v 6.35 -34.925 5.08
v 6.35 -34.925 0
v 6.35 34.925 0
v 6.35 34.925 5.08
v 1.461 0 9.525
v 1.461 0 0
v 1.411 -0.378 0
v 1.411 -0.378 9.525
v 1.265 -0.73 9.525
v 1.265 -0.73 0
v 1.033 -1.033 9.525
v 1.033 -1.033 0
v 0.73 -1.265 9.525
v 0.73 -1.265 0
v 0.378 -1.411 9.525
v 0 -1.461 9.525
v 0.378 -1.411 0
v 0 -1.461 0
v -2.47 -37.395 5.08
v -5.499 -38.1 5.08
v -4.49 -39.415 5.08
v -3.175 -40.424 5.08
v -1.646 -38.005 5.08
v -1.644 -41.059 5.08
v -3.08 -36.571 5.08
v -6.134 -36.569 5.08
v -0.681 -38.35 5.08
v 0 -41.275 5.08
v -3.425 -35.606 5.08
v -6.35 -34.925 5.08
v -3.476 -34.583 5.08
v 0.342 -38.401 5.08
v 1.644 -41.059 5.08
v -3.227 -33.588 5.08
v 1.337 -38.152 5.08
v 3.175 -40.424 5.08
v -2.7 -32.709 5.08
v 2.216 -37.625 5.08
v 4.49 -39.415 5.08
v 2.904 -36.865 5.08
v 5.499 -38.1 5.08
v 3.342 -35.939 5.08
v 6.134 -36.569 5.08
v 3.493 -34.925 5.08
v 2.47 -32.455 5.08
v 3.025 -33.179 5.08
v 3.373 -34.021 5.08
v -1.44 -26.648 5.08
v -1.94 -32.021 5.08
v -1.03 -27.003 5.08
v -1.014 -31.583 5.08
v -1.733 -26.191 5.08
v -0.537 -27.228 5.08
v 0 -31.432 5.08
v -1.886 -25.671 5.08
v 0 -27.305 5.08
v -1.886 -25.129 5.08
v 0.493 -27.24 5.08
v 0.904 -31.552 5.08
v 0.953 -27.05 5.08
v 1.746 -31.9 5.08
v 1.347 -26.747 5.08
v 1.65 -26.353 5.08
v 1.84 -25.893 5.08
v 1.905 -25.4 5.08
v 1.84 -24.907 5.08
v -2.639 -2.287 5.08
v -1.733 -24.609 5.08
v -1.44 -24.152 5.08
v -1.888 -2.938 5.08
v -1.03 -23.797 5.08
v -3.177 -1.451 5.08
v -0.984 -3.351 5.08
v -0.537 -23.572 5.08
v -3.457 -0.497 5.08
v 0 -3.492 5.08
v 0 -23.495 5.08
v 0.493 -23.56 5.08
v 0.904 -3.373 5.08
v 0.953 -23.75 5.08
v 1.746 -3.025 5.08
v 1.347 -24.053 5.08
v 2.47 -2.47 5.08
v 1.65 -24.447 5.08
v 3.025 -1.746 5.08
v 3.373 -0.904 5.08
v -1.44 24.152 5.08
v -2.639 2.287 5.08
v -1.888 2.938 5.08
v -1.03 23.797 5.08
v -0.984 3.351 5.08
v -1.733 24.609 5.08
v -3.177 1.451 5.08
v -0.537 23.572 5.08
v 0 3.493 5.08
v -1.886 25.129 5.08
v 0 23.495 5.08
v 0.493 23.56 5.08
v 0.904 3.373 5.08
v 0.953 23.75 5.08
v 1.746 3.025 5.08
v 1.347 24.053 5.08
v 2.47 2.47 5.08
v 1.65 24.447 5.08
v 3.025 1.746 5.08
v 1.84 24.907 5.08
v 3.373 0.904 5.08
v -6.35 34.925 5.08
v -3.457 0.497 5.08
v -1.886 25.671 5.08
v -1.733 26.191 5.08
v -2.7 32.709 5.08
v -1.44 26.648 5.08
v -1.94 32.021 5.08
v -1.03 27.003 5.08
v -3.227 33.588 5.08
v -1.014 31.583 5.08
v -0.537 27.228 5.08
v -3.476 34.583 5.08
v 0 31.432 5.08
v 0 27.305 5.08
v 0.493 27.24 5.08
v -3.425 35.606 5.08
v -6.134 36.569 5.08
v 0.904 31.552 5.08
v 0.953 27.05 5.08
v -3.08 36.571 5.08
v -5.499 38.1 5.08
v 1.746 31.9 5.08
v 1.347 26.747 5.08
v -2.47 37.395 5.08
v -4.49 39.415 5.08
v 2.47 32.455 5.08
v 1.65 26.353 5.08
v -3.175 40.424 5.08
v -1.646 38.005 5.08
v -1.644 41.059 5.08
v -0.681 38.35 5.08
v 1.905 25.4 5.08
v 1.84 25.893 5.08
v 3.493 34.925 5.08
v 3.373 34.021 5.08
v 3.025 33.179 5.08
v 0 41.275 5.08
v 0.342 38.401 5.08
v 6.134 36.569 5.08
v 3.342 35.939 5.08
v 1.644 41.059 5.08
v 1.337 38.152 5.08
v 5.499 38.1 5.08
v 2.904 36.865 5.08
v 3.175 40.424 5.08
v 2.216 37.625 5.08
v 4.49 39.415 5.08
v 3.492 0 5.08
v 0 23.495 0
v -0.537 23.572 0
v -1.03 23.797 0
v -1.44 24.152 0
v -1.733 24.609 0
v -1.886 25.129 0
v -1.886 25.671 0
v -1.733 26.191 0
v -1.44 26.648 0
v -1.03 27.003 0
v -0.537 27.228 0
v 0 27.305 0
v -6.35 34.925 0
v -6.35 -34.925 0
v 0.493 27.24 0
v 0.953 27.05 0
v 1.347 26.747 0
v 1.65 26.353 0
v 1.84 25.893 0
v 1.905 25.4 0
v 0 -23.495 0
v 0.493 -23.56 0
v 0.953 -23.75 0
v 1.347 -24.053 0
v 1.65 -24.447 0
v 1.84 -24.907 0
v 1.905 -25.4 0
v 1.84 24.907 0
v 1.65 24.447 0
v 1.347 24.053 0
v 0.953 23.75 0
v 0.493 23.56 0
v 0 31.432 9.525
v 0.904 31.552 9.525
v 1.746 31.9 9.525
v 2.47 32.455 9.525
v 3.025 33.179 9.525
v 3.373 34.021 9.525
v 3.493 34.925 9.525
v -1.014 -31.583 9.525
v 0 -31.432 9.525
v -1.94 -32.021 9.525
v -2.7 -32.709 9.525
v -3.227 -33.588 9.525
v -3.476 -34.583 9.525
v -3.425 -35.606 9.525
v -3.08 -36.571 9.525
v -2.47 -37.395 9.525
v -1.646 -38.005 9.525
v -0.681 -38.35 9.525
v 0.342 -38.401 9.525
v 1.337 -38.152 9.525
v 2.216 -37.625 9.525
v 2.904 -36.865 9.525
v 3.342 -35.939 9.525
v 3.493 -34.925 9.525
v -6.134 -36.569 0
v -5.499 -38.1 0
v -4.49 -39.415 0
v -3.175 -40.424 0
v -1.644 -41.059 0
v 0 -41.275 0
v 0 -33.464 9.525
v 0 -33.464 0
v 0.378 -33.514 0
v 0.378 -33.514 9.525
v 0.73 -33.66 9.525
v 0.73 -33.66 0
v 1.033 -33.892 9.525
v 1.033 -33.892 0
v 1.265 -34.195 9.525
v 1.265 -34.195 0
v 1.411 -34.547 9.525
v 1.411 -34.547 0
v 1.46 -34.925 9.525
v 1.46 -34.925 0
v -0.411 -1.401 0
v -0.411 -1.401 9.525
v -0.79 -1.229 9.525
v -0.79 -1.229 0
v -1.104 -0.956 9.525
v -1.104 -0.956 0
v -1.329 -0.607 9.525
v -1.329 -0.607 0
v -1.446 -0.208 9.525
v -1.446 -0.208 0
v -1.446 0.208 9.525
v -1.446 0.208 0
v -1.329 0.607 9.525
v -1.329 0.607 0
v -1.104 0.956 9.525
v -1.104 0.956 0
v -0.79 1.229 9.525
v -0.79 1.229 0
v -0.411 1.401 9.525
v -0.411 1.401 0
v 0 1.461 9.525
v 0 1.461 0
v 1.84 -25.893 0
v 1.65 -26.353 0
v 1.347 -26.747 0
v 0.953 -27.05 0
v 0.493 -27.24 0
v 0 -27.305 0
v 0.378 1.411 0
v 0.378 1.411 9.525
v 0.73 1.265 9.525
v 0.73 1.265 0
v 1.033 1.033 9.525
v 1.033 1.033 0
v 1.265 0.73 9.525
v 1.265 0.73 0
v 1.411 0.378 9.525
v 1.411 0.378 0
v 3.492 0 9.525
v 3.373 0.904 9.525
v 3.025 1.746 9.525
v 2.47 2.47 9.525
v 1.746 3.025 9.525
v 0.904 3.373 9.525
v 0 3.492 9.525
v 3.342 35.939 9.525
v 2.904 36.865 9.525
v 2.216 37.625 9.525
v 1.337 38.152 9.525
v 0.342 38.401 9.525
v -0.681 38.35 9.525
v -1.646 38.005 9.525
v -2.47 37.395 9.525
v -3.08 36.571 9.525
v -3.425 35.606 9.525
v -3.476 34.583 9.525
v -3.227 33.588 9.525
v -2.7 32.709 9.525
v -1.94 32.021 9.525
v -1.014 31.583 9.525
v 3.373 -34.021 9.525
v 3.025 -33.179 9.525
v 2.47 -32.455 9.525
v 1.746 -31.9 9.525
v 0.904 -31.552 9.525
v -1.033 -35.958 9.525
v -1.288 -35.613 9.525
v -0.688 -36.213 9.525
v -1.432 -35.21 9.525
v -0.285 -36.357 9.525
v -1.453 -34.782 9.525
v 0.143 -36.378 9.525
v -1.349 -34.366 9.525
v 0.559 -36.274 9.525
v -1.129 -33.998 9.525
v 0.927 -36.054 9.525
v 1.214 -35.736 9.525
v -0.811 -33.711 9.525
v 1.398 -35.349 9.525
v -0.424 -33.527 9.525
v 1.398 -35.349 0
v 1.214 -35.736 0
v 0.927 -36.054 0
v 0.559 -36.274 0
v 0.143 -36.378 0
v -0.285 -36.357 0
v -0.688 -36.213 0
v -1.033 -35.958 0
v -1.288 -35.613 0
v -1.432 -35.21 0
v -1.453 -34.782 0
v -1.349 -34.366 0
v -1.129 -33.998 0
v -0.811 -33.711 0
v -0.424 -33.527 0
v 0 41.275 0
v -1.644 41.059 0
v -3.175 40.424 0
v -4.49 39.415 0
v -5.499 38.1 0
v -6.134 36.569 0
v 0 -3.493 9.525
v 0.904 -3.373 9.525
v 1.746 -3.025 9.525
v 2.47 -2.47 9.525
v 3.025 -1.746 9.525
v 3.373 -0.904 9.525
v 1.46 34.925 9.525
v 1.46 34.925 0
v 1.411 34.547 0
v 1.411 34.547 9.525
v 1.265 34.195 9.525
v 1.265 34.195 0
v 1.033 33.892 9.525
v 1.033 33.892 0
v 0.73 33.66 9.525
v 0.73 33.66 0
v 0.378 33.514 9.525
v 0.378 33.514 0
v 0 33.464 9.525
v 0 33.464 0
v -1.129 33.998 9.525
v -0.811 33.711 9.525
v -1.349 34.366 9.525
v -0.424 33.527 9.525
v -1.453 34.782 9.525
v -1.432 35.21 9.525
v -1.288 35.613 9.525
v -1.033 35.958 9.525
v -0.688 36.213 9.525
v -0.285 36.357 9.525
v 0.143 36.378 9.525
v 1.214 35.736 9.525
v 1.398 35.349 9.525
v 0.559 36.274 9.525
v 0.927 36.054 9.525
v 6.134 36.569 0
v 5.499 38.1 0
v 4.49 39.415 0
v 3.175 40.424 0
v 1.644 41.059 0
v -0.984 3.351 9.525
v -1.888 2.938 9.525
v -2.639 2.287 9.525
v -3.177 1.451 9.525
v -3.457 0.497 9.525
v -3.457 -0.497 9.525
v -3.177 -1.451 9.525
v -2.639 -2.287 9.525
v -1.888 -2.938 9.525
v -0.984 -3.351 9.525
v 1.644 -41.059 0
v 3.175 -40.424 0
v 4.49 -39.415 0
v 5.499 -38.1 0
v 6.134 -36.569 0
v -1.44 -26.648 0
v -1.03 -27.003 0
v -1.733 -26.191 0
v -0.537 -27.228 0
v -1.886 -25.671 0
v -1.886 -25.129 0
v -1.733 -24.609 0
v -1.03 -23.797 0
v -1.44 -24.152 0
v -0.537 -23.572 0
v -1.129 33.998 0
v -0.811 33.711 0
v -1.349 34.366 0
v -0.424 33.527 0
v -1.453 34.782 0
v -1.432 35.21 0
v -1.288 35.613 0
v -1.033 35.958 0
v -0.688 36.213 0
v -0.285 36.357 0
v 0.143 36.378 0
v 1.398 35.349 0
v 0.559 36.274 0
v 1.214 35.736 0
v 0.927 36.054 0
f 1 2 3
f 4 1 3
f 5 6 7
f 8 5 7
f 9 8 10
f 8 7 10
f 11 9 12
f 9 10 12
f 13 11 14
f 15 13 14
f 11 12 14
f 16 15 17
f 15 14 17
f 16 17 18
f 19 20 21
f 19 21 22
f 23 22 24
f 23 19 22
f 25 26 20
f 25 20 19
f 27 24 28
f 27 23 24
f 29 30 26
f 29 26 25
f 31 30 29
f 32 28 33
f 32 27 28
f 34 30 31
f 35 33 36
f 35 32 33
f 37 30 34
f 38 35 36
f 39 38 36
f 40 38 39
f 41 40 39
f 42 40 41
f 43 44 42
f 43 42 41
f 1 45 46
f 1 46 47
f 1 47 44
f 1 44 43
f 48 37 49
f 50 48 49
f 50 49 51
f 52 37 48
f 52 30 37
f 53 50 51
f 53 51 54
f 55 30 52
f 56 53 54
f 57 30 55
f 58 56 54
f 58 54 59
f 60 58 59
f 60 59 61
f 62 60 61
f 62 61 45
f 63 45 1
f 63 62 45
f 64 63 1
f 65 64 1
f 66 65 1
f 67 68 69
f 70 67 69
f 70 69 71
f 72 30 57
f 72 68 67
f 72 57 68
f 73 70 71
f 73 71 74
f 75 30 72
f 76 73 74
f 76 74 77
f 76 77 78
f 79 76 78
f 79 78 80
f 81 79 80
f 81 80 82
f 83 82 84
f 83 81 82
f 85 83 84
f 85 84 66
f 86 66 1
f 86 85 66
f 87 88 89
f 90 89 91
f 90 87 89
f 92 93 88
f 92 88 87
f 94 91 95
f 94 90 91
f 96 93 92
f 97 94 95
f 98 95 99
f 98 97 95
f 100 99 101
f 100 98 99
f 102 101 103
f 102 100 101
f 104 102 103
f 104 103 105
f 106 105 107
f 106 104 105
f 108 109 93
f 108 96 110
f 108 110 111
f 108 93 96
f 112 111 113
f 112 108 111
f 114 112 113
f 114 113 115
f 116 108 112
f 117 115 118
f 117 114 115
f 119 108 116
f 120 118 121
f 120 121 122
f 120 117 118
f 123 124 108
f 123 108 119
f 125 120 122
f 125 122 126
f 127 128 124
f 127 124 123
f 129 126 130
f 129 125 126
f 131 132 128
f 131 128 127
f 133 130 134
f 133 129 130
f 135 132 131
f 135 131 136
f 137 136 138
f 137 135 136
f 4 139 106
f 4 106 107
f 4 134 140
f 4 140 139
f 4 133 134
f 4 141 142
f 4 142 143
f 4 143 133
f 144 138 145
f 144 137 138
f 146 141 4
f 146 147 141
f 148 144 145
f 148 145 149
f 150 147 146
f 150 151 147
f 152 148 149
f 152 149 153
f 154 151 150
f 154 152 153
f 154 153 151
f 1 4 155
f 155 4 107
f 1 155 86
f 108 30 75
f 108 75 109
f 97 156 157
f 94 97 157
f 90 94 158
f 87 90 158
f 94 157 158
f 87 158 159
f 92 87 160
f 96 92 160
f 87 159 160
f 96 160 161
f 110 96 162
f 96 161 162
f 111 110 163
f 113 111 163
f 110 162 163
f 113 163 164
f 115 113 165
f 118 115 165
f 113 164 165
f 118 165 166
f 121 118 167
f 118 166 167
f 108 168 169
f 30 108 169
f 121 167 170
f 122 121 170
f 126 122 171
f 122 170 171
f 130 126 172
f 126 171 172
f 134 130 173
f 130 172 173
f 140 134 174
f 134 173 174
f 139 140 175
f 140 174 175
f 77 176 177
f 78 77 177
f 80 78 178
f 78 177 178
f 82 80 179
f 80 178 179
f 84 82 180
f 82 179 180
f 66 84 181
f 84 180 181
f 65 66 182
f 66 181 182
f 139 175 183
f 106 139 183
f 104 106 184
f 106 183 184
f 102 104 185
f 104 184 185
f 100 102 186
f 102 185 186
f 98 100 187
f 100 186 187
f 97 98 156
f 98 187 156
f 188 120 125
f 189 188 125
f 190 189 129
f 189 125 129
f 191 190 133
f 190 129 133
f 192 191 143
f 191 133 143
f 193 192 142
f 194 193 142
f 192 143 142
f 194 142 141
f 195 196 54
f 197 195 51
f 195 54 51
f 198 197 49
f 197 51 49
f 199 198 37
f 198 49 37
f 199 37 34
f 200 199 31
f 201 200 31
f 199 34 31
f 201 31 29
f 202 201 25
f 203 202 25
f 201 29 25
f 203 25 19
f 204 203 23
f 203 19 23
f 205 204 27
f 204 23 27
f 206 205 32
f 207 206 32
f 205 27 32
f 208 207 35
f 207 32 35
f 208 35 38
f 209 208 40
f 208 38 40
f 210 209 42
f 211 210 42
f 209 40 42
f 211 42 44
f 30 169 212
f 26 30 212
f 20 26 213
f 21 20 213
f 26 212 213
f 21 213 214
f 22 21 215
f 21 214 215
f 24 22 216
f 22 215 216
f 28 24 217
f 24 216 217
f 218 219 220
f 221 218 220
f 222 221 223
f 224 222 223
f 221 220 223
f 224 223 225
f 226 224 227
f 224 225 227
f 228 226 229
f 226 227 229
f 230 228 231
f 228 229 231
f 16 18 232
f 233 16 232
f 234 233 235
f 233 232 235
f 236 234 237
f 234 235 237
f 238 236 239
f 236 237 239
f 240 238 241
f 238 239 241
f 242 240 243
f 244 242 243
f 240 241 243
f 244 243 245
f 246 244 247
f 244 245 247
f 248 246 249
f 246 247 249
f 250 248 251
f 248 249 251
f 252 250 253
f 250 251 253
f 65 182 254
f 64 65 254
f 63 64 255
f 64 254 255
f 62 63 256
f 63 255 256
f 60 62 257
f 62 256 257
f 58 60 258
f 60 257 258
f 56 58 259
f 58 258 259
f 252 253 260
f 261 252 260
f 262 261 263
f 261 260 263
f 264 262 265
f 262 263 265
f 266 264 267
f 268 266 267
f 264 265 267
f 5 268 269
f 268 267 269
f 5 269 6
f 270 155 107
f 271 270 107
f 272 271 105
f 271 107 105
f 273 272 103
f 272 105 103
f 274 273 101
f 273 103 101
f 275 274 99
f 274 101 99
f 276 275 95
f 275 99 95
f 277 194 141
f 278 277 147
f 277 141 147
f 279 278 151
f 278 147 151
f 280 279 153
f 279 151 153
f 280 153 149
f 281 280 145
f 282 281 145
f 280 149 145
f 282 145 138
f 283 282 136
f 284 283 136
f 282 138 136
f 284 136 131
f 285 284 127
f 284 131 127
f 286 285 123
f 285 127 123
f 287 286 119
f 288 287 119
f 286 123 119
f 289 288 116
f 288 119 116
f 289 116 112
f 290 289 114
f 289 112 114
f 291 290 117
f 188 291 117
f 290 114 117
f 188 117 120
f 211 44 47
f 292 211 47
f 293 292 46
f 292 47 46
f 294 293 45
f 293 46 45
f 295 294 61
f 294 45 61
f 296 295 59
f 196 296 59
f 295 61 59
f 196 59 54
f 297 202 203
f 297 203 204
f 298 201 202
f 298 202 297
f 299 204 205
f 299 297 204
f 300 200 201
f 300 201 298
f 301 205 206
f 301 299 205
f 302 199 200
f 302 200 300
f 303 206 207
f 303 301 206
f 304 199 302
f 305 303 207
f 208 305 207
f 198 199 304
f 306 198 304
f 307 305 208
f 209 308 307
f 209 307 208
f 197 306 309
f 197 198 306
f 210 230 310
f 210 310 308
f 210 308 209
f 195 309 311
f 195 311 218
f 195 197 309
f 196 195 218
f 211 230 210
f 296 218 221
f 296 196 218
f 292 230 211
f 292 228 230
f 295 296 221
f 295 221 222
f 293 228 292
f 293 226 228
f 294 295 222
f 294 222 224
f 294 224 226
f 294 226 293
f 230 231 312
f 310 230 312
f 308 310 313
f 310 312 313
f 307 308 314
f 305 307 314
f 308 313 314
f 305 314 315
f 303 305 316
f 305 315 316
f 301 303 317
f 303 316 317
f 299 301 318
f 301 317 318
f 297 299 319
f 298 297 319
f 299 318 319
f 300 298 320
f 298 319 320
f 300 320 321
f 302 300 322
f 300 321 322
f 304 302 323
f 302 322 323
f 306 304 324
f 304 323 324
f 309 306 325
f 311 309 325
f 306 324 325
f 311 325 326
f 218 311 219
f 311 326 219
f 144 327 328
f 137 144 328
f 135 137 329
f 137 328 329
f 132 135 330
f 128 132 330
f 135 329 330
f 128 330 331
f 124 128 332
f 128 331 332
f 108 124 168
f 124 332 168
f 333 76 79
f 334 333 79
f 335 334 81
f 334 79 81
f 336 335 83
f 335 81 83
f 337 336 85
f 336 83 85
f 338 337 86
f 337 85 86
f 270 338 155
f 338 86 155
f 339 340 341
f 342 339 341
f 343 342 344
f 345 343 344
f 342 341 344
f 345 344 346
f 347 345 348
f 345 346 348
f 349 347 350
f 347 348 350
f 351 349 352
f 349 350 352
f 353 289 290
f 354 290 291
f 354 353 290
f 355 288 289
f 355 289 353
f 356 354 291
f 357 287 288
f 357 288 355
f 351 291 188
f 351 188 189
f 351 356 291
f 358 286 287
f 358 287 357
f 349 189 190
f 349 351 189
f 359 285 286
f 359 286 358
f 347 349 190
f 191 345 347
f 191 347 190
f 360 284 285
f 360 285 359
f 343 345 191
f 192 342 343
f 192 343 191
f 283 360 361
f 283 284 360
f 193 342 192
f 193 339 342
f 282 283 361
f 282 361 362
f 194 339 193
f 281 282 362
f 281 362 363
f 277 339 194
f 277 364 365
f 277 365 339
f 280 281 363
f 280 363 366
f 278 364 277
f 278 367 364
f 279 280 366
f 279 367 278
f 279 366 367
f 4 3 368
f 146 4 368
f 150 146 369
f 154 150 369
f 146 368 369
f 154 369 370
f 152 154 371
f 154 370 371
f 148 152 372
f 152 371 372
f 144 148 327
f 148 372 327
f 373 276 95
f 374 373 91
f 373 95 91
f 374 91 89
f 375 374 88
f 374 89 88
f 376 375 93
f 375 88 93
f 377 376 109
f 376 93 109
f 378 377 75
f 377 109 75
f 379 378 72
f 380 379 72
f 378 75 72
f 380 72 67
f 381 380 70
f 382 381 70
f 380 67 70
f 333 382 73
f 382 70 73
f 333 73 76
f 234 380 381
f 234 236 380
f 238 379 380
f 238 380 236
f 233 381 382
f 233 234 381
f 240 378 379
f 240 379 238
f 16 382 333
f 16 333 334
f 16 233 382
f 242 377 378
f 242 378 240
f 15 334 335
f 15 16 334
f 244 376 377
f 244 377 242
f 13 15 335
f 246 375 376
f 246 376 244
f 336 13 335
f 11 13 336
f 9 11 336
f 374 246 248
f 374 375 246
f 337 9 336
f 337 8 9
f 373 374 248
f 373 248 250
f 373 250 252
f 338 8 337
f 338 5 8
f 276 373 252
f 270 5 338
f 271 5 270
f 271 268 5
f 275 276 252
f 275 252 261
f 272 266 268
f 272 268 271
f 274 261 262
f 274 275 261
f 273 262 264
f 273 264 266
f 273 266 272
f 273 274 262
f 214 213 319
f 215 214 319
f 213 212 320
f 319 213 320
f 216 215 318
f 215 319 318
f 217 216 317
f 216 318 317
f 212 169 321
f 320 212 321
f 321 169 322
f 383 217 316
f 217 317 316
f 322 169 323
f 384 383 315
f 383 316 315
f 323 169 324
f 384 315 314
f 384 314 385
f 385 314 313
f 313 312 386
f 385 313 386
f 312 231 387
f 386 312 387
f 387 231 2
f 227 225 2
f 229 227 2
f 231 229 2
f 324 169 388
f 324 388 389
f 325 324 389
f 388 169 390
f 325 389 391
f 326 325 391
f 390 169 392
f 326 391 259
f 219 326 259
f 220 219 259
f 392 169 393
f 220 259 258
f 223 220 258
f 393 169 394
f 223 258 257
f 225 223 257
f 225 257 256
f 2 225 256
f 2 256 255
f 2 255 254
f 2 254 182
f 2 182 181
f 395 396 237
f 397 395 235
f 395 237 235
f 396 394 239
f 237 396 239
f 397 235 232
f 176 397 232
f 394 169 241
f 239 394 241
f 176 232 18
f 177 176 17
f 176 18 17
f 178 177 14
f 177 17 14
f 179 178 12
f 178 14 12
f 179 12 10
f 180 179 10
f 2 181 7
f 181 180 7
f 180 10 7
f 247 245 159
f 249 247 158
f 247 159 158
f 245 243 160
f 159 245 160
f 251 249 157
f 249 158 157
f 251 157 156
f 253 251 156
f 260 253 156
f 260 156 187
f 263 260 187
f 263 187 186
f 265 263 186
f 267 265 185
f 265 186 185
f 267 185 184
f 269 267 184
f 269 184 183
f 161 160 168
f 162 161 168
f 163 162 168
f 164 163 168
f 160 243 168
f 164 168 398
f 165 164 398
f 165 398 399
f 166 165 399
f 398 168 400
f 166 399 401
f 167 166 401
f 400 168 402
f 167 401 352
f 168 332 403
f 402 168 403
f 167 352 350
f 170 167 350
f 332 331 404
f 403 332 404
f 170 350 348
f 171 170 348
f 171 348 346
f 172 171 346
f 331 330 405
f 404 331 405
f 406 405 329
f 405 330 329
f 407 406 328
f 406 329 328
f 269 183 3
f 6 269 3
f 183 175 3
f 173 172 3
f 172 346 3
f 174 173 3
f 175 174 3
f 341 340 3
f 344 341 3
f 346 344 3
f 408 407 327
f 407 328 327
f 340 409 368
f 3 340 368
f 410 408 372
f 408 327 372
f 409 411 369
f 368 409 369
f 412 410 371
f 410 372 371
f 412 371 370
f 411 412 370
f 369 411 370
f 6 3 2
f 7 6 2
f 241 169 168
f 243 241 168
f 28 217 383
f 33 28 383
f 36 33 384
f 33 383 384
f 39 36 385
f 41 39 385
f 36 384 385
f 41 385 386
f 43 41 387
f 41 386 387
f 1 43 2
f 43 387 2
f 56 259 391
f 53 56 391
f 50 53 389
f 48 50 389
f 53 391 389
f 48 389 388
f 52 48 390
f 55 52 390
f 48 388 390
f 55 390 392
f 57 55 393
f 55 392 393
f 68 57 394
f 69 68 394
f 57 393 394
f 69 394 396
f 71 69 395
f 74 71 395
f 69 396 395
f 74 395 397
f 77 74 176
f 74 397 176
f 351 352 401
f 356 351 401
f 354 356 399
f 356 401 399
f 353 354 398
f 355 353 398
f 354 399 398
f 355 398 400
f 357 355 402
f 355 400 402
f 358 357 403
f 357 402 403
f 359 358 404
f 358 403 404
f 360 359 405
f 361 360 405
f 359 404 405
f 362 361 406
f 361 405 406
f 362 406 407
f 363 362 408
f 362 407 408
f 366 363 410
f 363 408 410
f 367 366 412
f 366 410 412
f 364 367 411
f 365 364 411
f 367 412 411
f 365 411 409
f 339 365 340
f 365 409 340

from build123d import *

# Parameters (mm, degrees)
F1_DEPTH = 5.08
F2_DEPTH = 9.525


with BuildPart() as f1:
    # F0 (on Top) → F1 (new body)
    with BuildSketch(Plane.XY):
        with BuildLine():
            ThreePointArc((0, -41.275), (4.4901280605, -39.4151280605), (6.35, -34.925))
            Line((6.35, -34.925), (6.35, 34.925))
            ThreePointArc((6.35, 34.925), (4.4901280605, 39.4151280605), (0, 41.275))
            ThreePointArc((0, 41.275), (-4.4901280605, 39.4151280605), (-6.35, 34.925))
            Line((-6.35, 34.925), (-6.35, -34.925))
            ThreePointArc((-6.35, -34.925), (-4.4901280605, -39.4151280605), (0, -41.275))
        make_face()
        with BuildLine():
            ThreePointArc((3.4925, -34.925), (-2.4695704333, -37.3945704333), (0, -31.4325))
            ThreePointArc((0, -31.4325), (2.4695704333, -32.4554295667), (3.4925, -34.925))
        make_face(mode=Mode.SUBTRACT)
        with BuildLine():
            ThreePointArc((0, -27.305), (-1.905, -25.4), (0, -23.495))
            ThreePointArc((0, -23.495), (1.3470384182, -24.0529615818), (1.905, -25.4))
            ThreePointArc((1.905, -25.4), (1.3470384182, -26.7470384182), (0, -27.305))
        make_face(mode=Mode.SUBTRACT)
        with BuildLine():
            ThreePointArc((0, -3.4925), (-3.4925, 0), (0, 3.4925))
            ThreePointArc((0, 3.4925), (2.4695704333, 2.4695704333), (3.4925, 0))
            ThreePointArc((3.4925, 0), (2.4695704333, -2.4695704333), (0, -3.4925))
        make_face(mode=Mode.SUBTRACT)
        with BuildLine():
            ThreePointArc((0, 23.495), (-1.905, 25.4), (0, 27.305))
            ThreePointArc((0, 27.305), (1.3470384182, 26.7470384182), (1.905, 25.4))
            ThreePointArc((1.905, 25.4), (1.3470384182, 24.0529615818), (0, 23.495))
        make_face(mode=Mode.SUBTRACT)
        with BuildLine():
            ThreePointArc((3.4925, 34.925), (2.4695704333, 32.4554295667), (0, 31.4325))
            ThreePointArc((0, 31.4325), (-2.4695704333, 37.3945704333), (3.4925, 34.925))
        make_face(mode=Mode.SUBTRACT)
    extrude(amount=F1_DEPTH)

    # F0 (on Top) → F2 (join)
    with BuildSketch(Plane.XY):
        with BuildLine():
            ThreePointArc((3.4925, -34.925), (2.4695704333, -32.4554295667), (0, -31.4325))
            ThreePointArc((0, -31.4325), (-2.4695704333, -37.3945704333), (3.4925, -34.925))
        make_face()
        with BuildLine():
            ThreePointArc((1.4605, -34.925), (-1.0327294539, -35.9577294539), (0, -33.4645))
            ThreePointArc((0, -33.4645), (1.0327294539, -33.8922705461), (1.4605, -34.925))
        make_face(mode=Mode.SUBTRACT)
        with BuildLine():
            ThreePointArc((3.4925, 0), (2.4695704333, 2.4695704333), (0, 3.4925))
            Line((0, 3.4925), (0, 1.4605))
            ThreePointArc((0, 1.4605), (1.0327294539, 1.0327294539), (1.4605, 0))
            ThreePointArc((1.4605, 0), (1.0327294539, -1.0327294539), (0, -1.4605))
            Line((0, -1.4605), (0, -3.4925))
            ThreePointArc((0, -3.4925), (2.4695704333, -2.4695704333), (3.4925, 0))
        make_face()
        with BuildLine():
            Line((0, 1.4605), (0, 3.4925))
            ThreePointArc((0, 3.4925), (-3.4925, 0), (0, -3.4925))
            Line((0, -3.4925), (0, -1.4605))
            ThreePointArc((0, -1.4605), (-1.4605, 0), (0, 1.4605))
        make_face()
        with BuildLine():
            ThreePointArc((3.4925, 34.925), (-2.4695704333, 37.3945704333), (0, 31.4325))
            ThreePointArc((0, 31.4325), (2.4695704333, 32.4554295667), (3.4925, 34.925))
        make_face()
        with BuildLine():
            ThreePointArc((1.4605, 34.925), (1.0327294539, 33.8922705461), (0, 33.4645))
            ThreePointArc((0, 33.4645), (-1.0327294539, 35.9577294539), (1.4605, 34.925))
        make_face(mode=Mode.SUBTRACT)
    extrude(amount=F2_DEPTH)


solid = f1.part
